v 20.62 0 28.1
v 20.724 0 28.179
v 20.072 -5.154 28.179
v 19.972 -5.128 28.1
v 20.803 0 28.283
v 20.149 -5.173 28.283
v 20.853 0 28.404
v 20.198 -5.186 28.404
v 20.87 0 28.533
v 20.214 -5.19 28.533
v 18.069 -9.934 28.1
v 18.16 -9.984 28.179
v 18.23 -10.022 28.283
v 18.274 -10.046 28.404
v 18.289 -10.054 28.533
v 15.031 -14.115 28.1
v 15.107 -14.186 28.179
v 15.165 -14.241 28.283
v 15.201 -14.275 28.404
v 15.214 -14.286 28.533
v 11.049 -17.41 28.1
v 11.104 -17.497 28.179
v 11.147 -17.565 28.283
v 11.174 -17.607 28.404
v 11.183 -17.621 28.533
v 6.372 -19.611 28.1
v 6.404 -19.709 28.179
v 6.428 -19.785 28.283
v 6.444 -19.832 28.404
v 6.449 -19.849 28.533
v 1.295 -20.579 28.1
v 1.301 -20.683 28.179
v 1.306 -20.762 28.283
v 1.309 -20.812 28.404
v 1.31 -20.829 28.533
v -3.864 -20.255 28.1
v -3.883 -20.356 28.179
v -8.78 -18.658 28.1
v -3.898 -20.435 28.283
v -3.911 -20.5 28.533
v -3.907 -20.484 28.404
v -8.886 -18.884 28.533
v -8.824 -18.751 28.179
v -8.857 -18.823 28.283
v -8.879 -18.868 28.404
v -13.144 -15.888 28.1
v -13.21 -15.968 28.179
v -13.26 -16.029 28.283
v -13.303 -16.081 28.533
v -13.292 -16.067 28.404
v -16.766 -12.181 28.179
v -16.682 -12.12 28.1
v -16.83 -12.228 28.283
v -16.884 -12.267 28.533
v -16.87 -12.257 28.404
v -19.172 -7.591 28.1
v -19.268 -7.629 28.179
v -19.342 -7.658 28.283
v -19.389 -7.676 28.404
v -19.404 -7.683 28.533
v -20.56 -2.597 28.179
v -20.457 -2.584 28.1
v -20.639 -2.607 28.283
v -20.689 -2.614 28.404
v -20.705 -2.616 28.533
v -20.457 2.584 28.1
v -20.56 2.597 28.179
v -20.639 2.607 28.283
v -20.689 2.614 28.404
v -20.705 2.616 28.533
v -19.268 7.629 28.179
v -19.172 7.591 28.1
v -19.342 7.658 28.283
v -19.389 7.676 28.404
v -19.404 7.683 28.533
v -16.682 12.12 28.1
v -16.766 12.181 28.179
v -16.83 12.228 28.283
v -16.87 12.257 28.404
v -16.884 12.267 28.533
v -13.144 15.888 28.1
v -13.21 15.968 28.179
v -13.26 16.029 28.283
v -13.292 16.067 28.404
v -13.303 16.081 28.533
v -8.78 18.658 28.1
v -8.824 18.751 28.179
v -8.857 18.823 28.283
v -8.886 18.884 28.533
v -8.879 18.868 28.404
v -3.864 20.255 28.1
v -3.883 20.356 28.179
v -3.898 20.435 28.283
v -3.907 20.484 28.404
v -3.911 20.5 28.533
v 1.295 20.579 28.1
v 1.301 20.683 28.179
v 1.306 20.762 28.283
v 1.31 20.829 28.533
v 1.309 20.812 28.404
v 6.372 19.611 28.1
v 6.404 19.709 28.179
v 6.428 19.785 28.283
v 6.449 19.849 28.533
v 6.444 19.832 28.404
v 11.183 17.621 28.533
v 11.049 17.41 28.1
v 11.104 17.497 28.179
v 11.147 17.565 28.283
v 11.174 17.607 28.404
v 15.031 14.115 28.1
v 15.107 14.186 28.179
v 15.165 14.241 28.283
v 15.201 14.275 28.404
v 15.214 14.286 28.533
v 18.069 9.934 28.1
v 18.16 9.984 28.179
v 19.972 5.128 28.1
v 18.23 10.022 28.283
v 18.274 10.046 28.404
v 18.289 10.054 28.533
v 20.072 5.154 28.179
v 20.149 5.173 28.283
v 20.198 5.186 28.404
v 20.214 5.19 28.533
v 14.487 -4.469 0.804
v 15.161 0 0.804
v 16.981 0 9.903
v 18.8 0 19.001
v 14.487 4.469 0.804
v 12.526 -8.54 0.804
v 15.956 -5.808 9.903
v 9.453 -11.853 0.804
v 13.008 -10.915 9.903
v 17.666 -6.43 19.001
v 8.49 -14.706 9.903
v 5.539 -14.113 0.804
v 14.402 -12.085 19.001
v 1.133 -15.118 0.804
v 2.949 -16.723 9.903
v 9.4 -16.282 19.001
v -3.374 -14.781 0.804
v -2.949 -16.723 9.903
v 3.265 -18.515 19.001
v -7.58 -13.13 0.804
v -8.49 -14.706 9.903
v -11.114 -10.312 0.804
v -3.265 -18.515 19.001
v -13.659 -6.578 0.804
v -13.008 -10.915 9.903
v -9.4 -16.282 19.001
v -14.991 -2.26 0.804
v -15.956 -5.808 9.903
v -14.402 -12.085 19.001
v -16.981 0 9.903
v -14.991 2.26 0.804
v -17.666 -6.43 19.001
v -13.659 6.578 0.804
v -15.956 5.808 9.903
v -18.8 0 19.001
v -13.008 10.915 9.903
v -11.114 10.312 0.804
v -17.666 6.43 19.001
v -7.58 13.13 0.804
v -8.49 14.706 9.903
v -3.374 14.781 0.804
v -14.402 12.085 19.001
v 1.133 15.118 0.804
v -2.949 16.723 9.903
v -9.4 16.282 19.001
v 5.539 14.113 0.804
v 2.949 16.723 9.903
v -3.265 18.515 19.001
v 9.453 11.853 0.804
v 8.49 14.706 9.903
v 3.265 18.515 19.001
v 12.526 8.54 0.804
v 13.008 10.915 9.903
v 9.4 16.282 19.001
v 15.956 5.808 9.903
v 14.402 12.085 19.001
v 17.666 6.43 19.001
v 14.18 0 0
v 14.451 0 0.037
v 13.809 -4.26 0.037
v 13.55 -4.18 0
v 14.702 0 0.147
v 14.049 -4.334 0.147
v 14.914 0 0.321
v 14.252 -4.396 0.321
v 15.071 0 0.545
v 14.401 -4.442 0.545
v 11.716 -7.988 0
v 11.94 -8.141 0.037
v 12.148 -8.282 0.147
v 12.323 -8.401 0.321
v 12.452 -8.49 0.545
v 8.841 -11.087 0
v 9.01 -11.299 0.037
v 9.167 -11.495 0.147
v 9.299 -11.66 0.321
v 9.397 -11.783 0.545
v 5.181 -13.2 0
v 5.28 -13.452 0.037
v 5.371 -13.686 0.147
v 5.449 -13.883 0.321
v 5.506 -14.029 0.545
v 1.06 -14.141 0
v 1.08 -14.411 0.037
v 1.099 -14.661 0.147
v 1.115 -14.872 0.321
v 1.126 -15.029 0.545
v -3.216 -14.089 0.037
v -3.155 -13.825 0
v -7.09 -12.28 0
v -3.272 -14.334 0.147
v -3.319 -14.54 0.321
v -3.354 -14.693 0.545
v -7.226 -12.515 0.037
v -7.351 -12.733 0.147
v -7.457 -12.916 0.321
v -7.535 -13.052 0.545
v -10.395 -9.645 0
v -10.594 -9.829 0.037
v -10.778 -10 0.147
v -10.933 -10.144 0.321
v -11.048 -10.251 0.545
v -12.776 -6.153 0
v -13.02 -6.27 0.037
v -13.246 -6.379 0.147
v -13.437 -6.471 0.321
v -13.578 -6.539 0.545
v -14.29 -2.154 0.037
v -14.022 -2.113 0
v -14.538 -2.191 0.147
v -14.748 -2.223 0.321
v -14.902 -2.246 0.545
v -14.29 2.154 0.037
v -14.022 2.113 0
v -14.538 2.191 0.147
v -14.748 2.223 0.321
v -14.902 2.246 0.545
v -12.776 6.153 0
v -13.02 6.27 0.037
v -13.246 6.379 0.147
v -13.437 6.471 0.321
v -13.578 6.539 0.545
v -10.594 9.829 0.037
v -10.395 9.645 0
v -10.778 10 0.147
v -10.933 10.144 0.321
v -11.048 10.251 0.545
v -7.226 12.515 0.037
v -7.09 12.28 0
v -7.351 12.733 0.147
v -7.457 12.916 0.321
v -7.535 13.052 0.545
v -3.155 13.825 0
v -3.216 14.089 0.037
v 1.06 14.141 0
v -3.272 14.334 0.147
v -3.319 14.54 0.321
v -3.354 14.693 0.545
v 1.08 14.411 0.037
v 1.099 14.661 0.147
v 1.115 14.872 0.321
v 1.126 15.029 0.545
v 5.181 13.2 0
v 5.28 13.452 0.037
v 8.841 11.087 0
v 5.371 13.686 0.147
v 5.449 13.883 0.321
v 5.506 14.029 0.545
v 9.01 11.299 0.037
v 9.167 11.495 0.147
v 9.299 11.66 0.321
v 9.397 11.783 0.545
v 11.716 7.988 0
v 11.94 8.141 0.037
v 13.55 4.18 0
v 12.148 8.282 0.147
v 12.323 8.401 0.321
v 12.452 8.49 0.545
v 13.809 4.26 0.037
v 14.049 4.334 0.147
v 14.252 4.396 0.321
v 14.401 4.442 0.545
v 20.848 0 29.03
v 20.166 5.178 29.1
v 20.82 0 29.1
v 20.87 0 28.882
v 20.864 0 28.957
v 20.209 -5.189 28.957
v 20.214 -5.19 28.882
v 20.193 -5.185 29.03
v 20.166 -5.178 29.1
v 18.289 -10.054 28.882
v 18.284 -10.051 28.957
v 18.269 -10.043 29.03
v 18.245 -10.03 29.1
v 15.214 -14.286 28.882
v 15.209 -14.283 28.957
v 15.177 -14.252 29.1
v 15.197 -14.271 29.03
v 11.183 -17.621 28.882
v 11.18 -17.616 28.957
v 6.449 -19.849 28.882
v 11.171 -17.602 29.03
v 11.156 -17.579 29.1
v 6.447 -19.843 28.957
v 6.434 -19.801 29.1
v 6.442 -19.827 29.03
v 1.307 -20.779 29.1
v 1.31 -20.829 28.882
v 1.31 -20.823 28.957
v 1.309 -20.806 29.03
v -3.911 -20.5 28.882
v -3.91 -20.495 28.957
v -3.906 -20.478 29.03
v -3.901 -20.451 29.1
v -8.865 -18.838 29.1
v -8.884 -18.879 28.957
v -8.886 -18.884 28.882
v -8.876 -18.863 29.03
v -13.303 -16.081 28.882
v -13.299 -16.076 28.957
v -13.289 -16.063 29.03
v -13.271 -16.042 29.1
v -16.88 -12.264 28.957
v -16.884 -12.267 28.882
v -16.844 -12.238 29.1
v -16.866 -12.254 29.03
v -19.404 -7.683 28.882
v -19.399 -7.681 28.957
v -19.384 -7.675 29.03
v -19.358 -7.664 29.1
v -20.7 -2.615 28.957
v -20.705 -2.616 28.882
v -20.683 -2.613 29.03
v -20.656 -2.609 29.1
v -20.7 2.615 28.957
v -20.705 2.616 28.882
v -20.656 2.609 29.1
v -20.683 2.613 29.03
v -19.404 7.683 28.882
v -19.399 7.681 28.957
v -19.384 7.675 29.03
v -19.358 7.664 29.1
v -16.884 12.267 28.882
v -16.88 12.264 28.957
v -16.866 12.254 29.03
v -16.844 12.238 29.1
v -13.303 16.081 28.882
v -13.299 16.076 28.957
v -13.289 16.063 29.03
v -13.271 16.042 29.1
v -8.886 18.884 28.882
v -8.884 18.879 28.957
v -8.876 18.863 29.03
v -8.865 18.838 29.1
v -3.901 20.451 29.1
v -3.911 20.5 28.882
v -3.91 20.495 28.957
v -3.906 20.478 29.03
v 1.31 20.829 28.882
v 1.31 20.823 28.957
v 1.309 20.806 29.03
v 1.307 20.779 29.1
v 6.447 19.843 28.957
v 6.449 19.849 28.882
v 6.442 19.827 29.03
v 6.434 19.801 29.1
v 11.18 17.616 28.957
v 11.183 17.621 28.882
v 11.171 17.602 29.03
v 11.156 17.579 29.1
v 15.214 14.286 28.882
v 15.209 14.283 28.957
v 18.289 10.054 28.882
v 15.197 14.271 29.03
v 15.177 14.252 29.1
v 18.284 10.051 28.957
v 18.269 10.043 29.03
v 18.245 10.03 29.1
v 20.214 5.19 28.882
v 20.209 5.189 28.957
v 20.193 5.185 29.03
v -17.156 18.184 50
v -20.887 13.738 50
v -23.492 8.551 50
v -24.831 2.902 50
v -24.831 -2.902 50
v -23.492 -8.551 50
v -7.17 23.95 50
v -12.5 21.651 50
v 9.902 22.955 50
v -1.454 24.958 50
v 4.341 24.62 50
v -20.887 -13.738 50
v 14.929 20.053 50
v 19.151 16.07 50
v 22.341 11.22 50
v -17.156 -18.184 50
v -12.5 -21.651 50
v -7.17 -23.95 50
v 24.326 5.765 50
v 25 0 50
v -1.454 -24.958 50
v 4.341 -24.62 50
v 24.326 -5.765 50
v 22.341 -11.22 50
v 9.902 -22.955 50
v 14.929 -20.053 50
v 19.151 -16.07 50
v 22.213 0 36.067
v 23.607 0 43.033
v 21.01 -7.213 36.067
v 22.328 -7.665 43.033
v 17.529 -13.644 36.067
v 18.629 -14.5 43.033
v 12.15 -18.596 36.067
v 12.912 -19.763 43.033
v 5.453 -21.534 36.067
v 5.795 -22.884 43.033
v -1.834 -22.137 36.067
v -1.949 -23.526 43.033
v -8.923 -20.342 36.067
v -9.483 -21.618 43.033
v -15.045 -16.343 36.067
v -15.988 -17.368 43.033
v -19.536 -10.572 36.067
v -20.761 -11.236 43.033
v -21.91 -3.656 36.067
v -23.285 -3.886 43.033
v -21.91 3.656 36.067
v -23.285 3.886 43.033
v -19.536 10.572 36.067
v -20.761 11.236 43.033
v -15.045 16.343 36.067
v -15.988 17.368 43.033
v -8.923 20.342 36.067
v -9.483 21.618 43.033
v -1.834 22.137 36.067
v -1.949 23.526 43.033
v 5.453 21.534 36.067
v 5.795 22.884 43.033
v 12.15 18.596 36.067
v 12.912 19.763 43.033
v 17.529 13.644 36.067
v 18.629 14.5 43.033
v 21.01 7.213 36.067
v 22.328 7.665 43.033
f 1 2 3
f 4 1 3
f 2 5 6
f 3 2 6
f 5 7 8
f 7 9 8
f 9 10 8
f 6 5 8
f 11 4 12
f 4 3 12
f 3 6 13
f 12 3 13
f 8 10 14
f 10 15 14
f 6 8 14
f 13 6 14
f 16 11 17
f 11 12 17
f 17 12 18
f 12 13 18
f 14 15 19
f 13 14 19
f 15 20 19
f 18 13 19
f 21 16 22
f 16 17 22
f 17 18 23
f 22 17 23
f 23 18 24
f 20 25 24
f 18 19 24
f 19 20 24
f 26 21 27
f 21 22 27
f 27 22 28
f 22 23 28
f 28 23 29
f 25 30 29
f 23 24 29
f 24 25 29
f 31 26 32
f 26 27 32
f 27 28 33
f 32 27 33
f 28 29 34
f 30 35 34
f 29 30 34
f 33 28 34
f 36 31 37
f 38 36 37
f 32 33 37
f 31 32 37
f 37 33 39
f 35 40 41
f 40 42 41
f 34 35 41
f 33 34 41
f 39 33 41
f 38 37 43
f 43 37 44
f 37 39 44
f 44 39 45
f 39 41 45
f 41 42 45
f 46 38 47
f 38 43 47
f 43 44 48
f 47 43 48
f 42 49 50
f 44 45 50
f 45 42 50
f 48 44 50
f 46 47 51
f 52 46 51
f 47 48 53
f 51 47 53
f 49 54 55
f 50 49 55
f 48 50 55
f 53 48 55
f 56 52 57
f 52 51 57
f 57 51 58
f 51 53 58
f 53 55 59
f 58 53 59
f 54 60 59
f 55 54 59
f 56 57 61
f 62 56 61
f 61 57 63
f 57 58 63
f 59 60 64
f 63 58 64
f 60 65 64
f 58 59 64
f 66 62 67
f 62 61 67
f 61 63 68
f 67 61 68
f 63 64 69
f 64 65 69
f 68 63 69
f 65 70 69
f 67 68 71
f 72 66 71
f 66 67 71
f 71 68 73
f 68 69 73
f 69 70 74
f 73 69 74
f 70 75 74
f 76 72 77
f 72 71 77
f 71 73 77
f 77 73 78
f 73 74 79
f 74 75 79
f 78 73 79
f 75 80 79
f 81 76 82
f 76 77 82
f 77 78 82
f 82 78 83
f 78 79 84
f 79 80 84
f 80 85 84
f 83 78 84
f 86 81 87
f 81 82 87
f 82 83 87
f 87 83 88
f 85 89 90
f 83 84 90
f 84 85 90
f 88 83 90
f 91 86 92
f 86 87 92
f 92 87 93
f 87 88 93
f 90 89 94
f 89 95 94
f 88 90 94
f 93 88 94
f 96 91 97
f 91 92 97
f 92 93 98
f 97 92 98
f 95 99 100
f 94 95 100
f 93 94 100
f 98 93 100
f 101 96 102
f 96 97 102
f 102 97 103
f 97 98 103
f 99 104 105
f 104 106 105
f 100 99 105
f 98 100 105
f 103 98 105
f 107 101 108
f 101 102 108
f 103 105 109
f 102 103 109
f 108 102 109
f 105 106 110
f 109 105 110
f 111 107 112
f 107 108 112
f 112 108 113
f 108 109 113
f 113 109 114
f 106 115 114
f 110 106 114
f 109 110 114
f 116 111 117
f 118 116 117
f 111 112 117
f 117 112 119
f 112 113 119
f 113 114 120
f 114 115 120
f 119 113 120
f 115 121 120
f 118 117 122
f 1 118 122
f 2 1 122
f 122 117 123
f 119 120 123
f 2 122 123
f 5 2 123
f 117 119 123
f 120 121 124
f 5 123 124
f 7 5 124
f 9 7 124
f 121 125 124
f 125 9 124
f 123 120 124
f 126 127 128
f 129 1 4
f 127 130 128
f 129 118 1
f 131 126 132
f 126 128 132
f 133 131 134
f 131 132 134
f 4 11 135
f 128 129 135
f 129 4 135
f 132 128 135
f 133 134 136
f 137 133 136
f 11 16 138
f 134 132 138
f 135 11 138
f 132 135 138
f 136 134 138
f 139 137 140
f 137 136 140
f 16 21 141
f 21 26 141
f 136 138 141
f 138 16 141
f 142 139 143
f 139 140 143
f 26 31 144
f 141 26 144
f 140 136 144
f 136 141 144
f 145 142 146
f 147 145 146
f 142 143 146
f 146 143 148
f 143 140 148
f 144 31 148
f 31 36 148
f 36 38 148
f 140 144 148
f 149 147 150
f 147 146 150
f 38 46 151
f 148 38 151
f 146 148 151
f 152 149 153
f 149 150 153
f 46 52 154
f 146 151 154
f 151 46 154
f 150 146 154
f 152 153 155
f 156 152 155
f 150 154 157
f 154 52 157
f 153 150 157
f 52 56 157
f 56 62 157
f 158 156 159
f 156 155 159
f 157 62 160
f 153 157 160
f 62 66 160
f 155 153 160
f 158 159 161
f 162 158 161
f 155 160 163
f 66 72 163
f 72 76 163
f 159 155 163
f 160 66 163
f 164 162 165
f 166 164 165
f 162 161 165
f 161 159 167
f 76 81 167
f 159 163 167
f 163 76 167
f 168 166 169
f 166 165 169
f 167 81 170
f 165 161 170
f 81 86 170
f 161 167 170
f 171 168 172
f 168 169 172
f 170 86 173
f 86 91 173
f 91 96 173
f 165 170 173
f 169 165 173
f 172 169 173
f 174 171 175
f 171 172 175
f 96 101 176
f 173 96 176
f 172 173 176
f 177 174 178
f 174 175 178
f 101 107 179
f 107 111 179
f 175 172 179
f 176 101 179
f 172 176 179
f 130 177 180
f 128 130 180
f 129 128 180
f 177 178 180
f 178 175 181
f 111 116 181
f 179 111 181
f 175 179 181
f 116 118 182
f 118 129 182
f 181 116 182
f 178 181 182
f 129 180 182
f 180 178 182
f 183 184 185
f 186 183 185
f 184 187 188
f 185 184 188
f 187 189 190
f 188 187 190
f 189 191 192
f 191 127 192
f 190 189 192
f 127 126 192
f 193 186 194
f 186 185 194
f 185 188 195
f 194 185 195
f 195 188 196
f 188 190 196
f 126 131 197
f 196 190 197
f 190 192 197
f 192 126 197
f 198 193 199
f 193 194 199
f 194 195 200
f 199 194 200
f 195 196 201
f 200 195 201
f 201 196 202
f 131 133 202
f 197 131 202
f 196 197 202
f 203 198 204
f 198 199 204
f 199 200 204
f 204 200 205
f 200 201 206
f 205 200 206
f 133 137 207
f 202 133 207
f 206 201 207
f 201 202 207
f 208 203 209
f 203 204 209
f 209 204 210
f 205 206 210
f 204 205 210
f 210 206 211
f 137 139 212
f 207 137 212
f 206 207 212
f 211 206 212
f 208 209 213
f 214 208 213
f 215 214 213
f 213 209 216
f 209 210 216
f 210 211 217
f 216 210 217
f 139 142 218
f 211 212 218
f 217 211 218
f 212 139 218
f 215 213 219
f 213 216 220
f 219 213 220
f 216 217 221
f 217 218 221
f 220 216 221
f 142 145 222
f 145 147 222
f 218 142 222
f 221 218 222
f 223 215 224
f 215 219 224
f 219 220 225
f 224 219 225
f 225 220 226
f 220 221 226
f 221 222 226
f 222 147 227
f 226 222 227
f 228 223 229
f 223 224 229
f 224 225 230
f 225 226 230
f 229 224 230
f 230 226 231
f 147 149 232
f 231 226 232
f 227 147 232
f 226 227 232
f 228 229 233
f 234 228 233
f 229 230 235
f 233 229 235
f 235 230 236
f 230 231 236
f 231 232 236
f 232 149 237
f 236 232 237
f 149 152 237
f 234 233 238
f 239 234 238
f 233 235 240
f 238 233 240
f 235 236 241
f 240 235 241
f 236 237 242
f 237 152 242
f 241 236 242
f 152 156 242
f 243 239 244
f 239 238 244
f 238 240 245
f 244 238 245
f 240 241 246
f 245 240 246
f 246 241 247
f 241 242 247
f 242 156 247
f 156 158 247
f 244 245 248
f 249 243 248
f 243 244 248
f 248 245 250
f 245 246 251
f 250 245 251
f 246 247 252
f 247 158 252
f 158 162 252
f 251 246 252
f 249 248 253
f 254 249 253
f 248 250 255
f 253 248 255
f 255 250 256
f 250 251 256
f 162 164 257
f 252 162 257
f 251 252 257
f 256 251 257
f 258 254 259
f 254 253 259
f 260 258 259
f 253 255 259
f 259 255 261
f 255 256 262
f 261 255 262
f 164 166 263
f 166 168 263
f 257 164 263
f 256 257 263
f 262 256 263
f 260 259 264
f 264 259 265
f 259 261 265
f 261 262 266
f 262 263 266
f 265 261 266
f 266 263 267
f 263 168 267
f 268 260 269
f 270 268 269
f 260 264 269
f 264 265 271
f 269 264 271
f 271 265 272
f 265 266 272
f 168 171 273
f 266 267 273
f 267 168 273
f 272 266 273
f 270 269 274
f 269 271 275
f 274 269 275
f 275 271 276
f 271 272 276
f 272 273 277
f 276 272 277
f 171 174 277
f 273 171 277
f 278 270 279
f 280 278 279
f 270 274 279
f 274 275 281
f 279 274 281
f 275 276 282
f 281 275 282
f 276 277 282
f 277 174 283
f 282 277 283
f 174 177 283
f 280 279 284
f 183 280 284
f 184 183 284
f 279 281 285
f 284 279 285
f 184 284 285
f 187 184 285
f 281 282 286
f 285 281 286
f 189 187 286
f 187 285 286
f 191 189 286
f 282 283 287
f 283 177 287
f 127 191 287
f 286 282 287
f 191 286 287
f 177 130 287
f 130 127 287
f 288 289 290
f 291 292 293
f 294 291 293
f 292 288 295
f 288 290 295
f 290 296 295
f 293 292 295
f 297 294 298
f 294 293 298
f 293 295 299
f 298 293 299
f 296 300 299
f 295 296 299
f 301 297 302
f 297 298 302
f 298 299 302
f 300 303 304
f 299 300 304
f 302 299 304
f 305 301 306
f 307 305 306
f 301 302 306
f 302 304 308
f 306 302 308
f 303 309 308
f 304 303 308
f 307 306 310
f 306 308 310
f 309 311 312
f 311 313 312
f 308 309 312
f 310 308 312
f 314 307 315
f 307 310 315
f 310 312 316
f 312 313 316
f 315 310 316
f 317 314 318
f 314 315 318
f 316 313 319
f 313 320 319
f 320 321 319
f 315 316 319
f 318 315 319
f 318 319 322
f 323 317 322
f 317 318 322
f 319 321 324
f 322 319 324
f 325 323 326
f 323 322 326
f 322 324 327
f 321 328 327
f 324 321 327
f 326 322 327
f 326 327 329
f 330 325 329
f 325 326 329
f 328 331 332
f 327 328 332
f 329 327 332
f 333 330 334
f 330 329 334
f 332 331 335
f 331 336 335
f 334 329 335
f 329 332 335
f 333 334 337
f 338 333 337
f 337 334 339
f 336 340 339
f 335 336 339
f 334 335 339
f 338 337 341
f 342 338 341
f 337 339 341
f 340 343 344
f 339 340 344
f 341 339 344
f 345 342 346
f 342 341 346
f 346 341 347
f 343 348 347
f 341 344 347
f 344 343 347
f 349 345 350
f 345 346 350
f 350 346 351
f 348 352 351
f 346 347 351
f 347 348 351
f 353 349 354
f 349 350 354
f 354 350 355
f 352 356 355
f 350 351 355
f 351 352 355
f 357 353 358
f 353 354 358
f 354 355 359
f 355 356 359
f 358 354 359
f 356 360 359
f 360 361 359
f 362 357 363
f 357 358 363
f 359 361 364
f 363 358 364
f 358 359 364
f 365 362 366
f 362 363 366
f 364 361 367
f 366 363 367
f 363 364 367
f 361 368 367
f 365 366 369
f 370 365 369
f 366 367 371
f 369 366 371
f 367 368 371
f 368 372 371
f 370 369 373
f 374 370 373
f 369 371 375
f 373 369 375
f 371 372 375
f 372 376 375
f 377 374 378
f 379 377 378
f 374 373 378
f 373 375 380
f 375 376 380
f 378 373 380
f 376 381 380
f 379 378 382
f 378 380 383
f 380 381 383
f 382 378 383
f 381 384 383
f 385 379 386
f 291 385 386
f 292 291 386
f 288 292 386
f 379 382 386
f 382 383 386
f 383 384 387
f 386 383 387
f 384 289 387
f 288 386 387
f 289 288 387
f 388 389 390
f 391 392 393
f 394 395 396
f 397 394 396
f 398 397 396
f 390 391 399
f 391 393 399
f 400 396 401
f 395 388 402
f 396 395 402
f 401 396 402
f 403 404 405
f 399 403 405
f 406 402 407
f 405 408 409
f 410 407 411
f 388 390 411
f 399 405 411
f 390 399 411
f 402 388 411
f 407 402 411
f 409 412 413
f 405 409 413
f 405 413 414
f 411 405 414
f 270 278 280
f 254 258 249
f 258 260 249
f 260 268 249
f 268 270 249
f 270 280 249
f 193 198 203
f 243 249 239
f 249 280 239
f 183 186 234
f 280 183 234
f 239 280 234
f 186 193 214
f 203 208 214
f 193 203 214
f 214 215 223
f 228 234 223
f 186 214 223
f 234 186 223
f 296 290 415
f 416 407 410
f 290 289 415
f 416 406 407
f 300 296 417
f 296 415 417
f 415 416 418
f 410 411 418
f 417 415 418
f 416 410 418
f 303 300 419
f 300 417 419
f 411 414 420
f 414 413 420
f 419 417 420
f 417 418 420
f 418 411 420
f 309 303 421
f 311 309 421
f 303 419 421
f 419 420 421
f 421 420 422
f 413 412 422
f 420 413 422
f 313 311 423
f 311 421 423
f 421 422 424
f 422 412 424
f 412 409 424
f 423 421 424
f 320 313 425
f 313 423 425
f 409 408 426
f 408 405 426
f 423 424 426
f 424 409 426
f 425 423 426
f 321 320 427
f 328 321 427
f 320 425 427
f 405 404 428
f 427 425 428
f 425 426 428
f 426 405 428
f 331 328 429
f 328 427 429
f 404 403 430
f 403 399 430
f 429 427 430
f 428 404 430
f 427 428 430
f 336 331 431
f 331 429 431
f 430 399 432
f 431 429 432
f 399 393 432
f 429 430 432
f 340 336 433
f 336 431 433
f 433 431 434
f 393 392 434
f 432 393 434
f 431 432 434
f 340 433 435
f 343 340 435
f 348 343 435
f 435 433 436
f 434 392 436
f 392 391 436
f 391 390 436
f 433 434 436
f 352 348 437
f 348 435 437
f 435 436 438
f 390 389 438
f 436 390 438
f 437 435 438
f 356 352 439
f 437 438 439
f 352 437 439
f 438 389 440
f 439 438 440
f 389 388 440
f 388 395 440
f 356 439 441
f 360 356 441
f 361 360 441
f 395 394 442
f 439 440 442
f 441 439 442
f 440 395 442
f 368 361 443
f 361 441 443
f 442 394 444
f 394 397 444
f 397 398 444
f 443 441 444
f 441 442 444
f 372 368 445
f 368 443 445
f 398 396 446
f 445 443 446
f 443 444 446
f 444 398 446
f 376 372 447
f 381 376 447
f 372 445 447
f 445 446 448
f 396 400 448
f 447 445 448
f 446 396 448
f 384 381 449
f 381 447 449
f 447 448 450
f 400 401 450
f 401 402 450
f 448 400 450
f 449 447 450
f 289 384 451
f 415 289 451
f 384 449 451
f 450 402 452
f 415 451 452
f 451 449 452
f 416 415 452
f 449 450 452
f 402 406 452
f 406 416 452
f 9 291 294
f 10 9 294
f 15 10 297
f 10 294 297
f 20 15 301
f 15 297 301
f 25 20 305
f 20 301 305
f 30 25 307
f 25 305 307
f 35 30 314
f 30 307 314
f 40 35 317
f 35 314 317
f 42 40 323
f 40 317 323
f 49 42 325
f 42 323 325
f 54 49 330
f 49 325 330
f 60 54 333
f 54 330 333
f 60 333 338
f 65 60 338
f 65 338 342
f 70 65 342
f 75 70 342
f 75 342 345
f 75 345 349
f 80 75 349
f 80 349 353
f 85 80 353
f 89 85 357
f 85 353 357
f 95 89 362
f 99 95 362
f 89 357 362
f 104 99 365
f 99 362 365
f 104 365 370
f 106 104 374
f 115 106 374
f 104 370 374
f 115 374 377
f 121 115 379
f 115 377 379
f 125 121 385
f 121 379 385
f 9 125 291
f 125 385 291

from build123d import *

# Parameters (mm, degrees)
F2_R = 1


# Not quite as in the source:
# - a fillet or chamfer that OpenCascade refuses, or shapes differently, is made with other operations: its cross-section is extruded or revolved along the edge and cut away or added


with BuildPart() as f1:
    # F0 (on Front) → F1 (revolve)
    with BuildSketch(Plane.XZ):
        Polygon((0, 50), (0, 0), (15, 0), (20.62, 28.1), (20.82, 29.1), (25, 50), align=None)
        Polygon((20.82, 29.1), (20.62, 28.1), (20.87, 28.1), (20.87, 29.1), align=None)
    revolve(axis=Axis((0, 0, 25), (0, 0, -1)))

    # F2
    f2_edges = [f1.edges().sort_by_distance(p)[0] for p in [
        (-15, 0, 0),
    ]]
    fillet(f2_edges, radius=F2_R)

    # F3: fillet of radius 0.5 on 2 edges, made by hand

    # F3_s1 → F3_t2 (revolve, cut)
    with BuildSketch(Plane.XZ):
        with BuildLine():
            ThreePointArc((20.62, 28.1), (20.8030127019, 28.2830127019), (20.87, 28.5330127019))
            Line((20.87, 28.5330127019), (20.88, 28.5330127019))
            Line((20.88, 28.5330127019), (20.88, 28.1))
            Line((20.88, 28.1), (20.87, 28.09))
            ThreePointArc((20.87, 28.09), (20.745, 28.09), (20.625, 28.091339746))
            Line((20.625, 28.091339746), (20.62, 28.1))
        make_face()
    revolve(axis=Axis((0, 0, 28.1), (0, 0, -1)), mode=Mode.SUBTRACT)

    # F3_s3 → F3_t4 (revolve, cut)
    with BuildSketch(Plane.XZ):
        with BuildLine():
            ThreePointArc((20.87, 28.8820550528), (20.8573397172, 28.9938584517), (20.82, 29.1))
            Line((20.82, 29.1), (20.829, 29.1043588989))
            ThreePointArc((20.829, 29.1043588989), (20.845, 29.11), (20.87, 29.11))
            Line((20.87, 29.11), (20.88, 29.1))
            Line((20.88, 29.1), (20.88, 28.8820550528))
            Line((20.88, 28.8820550528), (20.87, 28.8820550528))
        make_face()
    revolve(axis=Axis((0, 0, 29.1), (0, 0, -1)), mode=Mode.SUBTRACT)


solid = f1.part
